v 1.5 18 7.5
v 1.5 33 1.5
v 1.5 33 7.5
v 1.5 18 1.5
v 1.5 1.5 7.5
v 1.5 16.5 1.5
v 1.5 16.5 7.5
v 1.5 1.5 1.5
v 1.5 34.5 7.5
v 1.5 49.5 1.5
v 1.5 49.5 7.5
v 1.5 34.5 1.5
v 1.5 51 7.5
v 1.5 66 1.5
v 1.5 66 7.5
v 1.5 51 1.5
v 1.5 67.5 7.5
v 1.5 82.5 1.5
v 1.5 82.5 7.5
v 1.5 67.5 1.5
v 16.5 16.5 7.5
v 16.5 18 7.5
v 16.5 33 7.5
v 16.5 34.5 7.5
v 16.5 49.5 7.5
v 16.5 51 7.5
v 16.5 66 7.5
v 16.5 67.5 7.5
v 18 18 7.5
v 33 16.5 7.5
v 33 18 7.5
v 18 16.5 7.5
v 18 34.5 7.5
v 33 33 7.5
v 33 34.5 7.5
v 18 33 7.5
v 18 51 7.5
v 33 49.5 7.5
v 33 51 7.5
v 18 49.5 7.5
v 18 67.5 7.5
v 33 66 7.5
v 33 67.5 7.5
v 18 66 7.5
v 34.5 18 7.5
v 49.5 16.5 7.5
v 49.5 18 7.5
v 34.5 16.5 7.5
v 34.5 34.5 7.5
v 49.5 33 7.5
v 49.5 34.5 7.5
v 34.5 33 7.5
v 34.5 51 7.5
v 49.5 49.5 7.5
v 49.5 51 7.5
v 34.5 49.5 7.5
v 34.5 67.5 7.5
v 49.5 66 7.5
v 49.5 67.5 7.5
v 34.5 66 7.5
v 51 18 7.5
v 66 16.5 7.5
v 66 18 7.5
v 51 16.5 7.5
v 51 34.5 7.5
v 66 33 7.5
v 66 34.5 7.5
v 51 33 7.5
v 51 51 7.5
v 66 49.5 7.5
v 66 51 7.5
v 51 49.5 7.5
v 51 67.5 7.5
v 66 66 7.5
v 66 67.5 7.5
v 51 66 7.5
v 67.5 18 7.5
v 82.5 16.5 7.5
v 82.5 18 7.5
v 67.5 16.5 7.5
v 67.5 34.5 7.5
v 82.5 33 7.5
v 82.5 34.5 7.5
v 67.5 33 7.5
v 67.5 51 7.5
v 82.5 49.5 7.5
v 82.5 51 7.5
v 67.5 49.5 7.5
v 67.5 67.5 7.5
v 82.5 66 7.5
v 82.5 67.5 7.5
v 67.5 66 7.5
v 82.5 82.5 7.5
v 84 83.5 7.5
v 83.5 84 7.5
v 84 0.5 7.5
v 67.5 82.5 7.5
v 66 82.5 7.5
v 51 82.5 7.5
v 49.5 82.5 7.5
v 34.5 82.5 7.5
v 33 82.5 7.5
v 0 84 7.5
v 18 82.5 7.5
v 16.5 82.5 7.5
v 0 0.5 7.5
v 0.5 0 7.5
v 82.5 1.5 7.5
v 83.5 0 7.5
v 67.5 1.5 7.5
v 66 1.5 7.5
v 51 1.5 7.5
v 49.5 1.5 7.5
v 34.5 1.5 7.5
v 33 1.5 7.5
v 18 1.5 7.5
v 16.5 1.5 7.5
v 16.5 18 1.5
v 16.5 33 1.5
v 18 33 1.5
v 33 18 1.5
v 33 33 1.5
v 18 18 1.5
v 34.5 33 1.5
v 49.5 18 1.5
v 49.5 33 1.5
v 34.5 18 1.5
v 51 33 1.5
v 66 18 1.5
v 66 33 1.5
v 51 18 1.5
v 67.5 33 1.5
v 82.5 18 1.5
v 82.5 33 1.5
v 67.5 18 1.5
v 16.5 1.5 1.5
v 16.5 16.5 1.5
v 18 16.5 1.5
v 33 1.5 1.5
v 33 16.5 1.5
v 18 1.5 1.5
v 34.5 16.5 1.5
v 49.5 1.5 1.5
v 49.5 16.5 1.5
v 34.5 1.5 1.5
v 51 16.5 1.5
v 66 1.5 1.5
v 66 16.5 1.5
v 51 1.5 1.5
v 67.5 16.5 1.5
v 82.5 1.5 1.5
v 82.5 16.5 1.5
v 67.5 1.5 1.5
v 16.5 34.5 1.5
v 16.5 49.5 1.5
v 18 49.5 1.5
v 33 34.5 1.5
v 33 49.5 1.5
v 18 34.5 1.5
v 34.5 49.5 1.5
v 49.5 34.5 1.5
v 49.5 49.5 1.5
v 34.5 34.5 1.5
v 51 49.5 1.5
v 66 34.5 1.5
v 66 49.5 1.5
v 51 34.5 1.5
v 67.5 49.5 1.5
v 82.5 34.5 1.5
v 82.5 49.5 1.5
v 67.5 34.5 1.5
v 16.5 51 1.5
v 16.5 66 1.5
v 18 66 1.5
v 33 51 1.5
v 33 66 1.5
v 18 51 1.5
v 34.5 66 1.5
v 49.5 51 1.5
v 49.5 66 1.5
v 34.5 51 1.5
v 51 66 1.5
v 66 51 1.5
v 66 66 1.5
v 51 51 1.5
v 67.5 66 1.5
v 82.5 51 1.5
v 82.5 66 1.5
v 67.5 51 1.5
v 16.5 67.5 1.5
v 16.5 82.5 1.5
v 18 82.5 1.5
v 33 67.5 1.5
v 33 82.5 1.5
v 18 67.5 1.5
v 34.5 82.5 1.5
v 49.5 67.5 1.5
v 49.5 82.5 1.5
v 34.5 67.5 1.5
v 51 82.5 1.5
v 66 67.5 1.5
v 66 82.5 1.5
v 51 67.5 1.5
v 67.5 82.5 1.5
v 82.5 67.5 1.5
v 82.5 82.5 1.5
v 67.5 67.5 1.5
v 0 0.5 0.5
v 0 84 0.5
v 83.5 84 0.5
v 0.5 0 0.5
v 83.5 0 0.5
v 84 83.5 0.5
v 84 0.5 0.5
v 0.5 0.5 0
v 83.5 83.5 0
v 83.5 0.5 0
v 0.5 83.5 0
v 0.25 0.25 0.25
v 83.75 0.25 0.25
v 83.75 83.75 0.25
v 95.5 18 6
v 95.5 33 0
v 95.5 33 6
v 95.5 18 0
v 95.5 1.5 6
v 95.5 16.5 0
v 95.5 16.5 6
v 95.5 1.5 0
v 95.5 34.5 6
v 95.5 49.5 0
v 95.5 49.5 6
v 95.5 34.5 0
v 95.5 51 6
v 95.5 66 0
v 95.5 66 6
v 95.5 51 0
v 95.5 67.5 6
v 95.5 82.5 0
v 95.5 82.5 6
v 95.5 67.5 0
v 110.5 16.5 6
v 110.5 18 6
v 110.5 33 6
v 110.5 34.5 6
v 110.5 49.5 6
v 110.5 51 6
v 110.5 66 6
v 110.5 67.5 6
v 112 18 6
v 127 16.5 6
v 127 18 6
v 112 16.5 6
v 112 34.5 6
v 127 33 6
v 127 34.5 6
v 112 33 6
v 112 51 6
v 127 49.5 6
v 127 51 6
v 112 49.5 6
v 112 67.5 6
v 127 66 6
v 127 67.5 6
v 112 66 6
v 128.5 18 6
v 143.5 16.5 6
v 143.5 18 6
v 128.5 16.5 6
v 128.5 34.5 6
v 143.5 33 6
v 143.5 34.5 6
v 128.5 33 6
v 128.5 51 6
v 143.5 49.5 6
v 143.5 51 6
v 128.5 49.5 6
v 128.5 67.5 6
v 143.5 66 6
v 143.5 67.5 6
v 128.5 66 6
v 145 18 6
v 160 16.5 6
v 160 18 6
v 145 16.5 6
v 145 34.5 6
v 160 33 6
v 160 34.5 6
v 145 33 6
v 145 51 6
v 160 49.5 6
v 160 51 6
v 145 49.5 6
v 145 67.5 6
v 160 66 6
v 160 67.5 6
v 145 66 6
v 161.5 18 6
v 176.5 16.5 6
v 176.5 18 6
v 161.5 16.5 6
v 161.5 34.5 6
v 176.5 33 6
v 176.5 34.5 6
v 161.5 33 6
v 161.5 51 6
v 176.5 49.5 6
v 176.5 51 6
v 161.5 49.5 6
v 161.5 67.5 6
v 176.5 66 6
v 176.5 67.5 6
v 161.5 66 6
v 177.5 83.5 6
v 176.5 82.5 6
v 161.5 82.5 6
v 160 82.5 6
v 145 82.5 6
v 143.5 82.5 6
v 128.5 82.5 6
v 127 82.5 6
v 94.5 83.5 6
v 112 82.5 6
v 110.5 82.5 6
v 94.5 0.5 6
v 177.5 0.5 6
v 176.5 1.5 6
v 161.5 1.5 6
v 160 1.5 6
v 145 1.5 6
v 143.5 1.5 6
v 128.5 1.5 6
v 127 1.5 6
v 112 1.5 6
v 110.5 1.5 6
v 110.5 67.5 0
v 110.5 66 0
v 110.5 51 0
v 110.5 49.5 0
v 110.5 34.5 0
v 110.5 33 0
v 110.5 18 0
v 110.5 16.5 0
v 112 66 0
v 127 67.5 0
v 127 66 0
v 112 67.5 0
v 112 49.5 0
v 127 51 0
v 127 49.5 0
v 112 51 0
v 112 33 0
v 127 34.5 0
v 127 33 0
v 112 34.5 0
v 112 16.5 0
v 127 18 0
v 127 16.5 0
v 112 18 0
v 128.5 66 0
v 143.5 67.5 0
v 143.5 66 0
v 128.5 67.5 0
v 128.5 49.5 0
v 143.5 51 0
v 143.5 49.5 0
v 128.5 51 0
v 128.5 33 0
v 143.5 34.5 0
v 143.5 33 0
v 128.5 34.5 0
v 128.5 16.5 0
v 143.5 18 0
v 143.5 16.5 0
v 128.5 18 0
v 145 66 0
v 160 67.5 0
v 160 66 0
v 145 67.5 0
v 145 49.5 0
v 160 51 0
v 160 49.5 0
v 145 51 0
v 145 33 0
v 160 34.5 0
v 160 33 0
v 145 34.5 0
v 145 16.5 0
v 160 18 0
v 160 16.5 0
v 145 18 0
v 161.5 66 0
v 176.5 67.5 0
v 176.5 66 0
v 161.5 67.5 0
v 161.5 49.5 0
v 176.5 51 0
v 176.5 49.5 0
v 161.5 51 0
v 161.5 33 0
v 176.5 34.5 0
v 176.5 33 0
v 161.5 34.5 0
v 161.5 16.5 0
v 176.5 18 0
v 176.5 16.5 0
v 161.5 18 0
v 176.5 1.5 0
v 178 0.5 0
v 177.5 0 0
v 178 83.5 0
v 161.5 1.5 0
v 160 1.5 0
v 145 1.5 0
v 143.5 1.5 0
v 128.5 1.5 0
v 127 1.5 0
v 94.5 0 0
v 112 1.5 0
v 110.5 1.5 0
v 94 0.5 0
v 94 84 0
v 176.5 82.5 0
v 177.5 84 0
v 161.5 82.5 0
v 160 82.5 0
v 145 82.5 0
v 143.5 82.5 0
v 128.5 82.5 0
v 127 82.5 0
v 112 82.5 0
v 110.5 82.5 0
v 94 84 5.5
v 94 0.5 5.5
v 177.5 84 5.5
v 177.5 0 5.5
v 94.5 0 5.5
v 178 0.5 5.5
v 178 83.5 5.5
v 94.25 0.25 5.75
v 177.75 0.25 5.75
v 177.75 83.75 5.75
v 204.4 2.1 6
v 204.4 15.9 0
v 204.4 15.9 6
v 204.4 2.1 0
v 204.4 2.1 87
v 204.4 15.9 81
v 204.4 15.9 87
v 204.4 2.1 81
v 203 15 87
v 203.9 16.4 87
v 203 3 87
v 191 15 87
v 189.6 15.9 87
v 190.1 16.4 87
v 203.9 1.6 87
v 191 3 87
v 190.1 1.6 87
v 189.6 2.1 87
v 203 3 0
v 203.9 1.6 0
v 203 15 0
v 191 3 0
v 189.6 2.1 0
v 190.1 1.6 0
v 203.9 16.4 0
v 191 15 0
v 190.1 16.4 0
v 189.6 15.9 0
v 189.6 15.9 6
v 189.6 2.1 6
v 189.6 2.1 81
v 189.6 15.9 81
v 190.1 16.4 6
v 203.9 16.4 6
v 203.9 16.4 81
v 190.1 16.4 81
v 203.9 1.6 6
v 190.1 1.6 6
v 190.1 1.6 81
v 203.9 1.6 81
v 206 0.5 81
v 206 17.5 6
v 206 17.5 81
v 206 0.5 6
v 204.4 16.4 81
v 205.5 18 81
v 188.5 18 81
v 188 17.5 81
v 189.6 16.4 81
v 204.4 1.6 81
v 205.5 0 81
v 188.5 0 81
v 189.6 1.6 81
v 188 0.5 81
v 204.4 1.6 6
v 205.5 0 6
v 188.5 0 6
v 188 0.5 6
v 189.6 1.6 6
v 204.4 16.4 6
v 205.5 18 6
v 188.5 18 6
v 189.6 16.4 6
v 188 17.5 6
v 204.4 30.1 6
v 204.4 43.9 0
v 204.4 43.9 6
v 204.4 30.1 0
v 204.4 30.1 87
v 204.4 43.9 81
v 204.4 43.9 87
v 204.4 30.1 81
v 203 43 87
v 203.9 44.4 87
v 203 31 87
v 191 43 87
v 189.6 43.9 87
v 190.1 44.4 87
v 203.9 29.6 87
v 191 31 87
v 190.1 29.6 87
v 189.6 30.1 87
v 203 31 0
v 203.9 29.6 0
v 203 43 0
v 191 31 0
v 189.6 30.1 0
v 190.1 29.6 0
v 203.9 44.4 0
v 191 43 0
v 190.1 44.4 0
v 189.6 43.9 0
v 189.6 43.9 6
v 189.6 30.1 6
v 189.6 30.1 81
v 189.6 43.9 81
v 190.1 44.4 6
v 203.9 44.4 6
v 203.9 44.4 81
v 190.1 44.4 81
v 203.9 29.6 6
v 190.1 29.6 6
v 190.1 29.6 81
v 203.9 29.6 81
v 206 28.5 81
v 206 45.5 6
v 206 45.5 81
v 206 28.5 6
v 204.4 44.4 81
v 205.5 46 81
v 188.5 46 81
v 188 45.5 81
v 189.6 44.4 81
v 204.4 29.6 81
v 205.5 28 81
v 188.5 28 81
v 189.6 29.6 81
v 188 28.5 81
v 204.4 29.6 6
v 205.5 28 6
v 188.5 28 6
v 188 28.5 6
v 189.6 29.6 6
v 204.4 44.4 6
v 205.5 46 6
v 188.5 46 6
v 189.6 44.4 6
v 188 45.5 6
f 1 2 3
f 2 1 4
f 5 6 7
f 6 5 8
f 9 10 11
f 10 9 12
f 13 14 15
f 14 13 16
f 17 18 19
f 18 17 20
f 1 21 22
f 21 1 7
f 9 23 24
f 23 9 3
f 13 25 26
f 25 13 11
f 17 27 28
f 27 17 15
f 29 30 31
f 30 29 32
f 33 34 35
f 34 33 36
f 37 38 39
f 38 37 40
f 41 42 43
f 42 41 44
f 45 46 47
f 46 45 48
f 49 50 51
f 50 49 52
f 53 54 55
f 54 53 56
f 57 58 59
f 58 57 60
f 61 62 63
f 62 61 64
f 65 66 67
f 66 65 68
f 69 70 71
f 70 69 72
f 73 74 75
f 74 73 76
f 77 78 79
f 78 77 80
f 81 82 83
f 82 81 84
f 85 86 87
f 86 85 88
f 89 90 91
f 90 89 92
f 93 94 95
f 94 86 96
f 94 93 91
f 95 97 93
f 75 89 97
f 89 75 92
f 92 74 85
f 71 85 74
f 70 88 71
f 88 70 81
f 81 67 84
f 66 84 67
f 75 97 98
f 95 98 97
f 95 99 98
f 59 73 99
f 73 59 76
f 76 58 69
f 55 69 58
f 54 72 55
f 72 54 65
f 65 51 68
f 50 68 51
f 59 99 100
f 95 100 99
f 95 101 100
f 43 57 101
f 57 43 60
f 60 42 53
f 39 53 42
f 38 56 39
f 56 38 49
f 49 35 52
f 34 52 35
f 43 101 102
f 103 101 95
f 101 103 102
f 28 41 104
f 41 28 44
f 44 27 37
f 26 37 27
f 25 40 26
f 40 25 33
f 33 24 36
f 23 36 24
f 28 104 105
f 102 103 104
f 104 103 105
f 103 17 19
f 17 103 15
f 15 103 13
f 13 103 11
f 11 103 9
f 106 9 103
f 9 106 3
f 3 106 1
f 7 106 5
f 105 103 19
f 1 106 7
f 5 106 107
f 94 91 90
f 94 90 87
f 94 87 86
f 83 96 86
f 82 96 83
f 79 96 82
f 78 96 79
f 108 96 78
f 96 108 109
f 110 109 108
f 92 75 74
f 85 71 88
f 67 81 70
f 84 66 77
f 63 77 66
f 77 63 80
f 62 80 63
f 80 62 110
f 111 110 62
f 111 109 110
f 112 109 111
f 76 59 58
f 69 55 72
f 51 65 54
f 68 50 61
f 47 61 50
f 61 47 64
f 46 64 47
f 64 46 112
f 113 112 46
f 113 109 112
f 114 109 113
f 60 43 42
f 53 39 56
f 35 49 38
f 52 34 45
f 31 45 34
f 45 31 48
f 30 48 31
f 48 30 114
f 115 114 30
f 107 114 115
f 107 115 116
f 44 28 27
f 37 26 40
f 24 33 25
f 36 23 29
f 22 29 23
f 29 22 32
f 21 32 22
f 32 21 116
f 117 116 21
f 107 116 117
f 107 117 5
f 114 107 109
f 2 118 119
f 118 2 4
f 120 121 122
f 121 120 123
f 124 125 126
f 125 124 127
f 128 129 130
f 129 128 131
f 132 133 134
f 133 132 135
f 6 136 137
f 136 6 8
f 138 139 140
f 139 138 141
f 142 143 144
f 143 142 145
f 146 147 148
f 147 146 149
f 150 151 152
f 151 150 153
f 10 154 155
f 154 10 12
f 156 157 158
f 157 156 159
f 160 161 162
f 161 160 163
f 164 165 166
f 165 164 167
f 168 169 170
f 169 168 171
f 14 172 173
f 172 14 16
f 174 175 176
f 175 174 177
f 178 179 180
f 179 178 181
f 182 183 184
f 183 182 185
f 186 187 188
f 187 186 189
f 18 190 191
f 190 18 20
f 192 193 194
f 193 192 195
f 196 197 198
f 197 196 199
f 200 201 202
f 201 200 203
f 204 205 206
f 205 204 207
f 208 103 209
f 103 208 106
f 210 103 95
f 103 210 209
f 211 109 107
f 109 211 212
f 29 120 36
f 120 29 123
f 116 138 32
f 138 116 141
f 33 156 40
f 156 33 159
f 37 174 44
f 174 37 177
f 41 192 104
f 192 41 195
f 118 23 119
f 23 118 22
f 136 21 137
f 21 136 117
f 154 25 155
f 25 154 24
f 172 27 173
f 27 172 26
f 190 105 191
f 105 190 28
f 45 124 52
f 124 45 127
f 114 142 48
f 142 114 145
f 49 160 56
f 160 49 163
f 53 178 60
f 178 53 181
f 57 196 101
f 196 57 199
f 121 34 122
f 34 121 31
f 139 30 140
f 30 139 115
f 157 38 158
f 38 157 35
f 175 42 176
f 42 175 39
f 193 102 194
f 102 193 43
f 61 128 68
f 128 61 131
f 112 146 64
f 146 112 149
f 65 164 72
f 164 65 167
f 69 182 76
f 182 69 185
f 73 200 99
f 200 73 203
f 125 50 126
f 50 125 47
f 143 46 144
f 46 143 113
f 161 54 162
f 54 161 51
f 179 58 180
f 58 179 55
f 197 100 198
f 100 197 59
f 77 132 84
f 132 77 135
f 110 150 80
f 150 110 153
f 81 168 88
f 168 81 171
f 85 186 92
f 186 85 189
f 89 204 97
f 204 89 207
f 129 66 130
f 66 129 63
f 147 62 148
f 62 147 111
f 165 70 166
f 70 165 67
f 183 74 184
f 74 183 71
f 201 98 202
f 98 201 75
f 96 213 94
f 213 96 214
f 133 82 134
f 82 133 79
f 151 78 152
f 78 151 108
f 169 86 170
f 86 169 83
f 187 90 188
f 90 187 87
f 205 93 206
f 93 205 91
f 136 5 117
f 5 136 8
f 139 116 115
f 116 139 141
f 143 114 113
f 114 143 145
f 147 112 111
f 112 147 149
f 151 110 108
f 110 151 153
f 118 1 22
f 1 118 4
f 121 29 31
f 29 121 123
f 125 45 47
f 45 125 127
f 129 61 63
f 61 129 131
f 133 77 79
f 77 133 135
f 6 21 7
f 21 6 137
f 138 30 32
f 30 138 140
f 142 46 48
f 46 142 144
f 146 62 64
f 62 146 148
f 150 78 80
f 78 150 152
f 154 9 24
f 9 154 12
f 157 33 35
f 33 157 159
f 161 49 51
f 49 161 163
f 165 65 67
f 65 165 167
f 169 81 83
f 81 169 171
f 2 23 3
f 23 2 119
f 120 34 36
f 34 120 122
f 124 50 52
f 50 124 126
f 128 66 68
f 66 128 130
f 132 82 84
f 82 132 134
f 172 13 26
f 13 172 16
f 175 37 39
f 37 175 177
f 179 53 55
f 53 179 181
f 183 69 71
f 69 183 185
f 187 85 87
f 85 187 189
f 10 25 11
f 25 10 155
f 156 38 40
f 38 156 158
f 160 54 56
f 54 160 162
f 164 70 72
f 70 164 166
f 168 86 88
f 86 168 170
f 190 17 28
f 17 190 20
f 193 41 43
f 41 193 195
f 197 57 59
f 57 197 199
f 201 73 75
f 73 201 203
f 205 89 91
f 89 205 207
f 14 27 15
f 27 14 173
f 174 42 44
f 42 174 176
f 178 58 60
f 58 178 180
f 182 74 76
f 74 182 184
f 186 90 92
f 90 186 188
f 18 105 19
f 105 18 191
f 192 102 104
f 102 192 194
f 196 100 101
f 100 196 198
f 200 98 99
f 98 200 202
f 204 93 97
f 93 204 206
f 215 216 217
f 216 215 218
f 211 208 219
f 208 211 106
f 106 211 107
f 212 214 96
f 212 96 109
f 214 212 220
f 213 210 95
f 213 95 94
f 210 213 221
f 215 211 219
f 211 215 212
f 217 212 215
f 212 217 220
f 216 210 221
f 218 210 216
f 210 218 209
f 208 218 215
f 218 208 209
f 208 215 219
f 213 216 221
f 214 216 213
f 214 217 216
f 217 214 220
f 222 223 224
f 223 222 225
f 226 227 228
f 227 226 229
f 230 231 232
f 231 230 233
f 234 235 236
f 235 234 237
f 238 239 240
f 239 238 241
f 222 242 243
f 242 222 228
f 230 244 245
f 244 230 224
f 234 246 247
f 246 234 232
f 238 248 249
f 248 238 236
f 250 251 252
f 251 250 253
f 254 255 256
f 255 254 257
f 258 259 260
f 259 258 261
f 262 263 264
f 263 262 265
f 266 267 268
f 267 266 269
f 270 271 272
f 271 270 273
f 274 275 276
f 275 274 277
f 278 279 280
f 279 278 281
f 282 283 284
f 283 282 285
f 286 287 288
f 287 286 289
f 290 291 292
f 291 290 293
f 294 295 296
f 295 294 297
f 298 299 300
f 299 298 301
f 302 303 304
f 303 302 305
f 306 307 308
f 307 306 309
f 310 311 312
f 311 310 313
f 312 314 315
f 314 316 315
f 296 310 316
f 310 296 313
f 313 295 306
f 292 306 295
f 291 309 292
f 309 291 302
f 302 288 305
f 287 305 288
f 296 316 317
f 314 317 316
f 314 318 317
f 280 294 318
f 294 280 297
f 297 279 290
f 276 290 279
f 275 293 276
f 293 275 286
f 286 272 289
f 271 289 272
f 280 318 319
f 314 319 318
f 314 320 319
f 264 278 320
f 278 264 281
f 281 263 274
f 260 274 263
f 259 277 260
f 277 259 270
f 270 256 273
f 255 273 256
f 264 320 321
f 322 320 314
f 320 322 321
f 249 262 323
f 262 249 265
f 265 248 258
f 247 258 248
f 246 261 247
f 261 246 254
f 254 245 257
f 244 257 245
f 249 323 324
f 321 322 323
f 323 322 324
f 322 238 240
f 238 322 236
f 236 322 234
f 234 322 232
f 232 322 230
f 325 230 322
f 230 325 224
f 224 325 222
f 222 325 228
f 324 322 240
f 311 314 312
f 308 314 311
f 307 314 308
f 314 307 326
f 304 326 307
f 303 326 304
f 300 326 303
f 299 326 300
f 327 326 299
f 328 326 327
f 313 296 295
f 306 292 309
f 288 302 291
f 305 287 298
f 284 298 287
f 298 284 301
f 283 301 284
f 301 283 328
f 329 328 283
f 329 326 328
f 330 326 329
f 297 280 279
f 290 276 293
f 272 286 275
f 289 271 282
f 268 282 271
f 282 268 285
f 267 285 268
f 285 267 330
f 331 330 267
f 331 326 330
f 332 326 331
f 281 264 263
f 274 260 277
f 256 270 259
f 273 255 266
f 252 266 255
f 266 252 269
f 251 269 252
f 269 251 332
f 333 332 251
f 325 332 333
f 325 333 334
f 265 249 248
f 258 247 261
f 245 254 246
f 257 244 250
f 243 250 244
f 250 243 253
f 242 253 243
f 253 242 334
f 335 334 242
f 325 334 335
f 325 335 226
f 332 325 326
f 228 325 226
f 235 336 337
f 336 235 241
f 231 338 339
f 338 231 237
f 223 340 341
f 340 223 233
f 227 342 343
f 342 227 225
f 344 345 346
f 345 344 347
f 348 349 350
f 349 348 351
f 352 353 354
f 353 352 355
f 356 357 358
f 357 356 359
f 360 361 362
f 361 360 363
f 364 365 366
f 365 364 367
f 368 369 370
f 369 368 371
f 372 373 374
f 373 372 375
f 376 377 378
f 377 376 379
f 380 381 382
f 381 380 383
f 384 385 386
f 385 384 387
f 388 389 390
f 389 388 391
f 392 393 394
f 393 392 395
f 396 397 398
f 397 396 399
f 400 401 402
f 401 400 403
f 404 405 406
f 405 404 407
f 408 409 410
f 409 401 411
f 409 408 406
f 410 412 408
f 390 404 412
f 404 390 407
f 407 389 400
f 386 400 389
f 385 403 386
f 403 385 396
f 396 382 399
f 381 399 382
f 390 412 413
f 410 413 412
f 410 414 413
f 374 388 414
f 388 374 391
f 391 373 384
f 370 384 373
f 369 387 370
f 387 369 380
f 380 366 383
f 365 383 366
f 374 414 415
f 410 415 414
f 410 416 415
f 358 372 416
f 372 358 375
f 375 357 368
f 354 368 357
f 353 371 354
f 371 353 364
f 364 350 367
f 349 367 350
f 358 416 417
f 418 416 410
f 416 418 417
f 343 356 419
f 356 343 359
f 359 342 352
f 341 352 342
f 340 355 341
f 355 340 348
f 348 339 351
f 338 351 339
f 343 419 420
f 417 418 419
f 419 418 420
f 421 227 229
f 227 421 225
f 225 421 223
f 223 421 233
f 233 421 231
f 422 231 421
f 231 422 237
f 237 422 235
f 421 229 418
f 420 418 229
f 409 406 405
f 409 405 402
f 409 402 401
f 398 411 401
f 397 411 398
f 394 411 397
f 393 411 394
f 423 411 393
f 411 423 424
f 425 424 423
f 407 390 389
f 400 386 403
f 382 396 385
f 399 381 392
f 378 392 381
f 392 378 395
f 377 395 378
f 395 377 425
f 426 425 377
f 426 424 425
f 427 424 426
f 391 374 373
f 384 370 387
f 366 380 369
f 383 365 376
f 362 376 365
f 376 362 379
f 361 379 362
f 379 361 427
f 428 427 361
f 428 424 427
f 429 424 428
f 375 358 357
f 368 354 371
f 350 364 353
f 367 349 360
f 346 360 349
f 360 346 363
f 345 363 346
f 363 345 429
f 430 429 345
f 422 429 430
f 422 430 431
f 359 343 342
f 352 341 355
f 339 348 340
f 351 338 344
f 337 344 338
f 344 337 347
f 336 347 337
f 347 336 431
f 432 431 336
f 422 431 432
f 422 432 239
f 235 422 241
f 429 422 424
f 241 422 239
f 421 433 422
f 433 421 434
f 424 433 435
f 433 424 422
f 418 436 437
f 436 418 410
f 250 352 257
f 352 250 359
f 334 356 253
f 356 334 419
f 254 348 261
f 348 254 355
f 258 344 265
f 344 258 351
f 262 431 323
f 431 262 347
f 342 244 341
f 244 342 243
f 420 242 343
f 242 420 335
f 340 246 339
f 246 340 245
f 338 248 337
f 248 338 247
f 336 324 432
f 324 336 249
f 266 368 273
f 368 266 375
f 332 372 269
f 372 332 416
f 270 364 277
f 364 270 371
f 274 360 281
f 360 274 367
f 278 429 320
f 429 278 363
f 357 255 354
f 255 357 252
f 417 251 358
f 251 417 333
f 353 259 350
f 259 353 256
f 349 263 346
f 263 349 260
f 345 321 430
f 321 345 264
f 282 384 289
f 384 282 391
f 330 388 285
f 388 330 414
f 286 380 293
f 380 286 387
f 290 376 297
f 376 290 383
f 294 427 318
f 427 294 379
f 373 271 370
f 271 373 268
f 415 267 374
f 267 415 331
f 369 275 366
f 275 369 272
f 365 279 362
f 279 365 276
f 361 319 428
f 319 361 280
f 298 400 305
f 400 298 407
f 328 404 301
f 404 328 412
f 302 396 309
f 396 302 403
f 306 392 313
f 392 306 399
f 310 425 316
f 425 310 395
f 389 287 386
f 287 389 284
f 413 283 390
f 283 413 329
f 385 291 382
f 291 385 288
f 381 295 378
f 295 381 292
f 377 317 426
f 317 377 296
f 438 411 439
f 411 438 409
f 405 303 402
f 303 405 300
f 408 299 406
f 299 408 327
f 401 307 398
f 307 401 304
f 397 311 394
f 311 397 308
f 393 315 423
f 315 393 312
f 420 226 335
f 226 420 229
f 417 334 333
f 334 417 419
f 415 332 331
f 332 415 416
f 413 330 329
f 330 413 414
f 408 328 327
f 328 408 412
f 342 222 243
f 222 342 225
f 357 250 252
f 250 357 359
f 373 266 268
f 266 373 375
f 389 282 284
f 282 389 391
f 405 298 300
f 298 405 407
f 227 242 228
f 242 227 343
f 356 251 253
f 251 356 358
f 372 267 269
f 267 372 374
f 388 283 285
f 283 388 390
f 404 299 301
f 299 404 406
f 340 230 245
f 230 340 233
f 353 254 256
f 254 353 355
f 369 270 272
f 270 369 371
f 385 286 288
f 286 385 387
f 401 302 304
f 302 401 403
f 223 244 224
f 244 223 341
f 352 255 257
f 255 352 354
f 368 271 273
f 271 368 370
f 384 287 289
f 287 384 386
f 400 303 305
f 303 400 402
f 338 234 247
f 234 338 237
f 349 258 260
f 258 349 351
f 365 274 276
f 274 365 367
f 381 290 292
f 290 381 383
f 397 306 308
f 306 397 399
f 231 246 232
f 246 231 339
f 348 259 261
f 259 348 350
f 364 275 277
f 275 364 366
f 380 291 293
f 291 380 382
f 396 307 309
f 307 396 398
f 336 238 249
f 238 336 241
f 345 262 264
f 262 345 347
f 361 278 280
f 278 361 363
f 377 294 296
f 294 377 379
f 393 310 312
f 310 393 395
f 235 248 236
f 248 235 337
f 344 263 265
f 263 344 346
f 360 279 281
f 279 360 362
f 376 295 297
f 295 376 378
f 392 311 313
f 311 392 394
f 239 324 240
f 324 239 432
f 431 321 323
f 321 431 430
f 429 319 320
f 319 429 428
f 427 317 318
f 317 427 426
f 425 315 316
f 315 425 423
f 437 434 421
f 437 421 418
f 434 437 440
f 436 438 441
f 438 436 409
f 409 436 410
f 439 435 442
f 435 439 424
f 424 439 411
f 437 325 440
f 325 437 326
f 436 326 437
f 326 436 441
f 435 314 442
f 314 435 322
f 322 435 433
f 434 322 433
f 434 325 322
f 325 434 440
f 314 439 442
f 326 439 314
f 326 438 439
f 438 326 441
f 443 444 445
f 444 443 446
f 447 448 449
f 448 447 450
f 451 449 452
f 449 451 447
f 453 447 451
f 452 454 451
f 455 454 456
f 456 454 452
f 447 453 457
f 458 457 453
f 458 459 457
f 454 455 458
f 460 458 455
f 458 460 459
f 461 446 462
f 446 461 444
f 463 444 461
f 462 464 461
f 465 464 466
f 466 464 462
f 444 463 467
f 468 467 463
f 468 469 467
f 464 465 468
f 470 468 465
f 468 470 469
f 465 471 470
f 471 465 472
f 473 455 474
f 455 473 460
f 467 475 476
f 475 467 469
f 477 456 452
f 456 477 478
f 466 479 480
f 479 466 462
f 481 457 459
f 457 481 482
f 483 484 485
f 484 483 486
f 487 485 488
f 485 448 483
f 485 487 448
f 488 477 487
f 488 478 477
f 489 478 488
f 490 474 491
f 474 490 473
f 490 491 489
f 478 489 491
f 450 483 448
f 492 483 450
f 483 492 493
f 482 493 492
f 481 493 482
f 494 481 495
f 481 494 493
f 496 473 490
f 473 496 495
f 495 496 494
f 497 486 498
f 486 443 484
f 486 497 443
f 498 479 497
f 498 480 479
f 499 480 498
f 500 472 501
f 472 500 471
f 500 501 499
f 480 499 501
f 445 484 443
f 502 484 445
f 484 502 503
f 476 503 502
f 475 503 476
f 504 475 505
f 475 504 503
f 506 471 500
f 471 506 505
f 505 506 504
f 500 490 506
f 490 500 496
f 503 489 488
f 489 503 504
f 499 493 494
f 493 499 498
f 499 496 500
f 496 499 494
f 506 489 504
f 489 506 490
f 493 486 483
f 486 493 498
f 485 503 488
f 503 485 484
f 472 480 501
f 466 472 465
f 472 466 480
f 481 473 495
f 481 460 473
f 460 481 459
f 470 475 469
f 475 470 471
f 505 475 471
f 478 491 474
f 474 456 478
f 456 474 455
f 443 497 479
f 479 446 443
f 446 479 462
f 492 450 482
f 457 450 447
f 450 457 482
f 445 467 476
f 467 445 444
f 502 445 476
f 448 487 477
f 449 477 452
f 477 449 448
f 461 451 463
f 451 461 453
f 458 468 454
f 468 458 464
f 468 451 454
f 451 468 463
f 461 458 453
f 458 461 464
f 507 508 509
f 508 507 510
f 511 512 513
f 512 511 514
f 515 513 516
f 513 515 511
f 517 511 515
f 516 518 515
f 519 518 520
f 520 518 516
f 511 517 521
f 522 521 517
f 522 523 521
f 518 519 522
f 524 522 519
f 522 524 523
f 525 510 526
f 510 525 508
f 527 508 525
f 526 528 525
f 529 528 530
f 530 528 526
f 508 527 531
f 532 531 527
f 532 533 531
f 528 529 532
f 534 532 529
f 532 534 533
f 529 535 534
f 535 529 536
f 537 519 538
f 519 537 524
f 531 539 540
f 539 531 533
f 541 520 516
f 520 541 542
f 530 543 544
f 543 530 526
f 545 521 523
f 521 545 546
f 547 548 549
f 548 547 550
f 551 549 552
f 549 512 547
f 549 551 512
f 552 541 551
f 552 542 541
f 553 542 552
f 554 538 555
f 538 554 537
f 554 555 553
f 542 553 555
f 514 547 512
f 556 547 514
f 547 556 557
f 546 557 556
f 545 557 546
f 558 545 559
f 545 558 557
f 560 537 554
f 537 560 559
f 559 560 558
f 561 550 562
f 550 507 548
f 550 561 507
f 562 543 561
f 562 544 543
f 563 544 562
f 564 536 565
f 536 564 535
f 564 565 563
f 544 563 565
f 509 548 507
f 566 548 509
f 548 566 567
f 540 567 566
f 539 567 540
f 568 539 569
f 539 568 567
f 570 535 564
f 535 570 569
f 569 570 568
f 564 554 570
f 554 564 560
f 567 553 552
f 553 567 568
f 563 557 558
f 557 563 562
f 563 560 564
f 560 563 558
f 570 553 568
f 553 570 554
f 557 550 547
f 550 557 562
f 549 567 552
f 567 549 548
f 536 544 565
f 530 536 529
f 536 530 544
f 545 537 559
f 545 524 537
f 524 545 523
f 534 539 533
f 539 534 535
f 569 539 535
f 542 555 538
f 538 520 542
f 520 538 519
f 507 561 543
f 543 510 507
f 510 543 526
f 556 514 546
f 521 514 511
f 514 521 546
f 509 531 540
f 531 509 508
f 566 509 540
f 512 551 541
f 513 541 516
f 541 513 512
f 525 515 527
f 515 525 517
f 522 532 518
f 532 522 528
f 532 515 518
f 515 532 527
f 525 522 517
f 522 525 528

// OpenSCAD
// preview[view:south west, tilt:top diagonal]

//number of x dimension holes
num_x_holes=5; 
//number of x dimension holes
num_y_holes=5; 
// size of holes on X axis (mm)
hole_x_size=15; 
// size of holes on Y axis (mm)
hole_y_size=15; 
// height of the upper and lower grid (mm)
grid_height=6; 
// thickness of the grid webs (mm)
web_thickness=1.5; // [1:0.5:3]
//Height of the risers (mm) between upper and lower
riser_height=75; //[10:200]
// number of vertical risers 
num_risers=2; // [0:1:6]
// hollow risers (boolean)
hollow_risers=1; // [0:NOT Hollow, 1:Hollow]

// hollow supports
show_base=1; // [0:NO base, 1:Include Base]
// hollow supports
show_top=1; // [0:NO top, 1:Include Top]


//bevel size (bevel on outer edges)
bevel_sz=.5; // [0:0.5:2]
//tolerance (increase if parts too tight, decrease if parts too loose)
tolerance=.1;  

/* [Hidden] */

//derived values
x_len=web_thickness + num_x_holes*(hole_x_size+web_thickness);
y_len=web_thickness + num_y_holes*(hole_y_size+web_thickness);
z_len=web_thickness;

show_part();

module show_part() {
    if ( show_base >0) {
        base();
    }
    if (show_top > 0 ) {
        translate([show_base * (x_len+10), 0,0])
            upper();
    }
    translate([(show_base + show_top)*(x_len+10), 0,0])
        riser();
}

module base() {
    difference() {
        union() {
            //base
            cube([x_len, y_len, z_len]);
            
            for(i=[0:num_x_holes]) {
                translate([i*(hole_x_size+web_thickness),0,z_len])
                    cube([web_thickness, 
                        y_len,
                        grid_height]);
            }
            for(i=[0:num_y_holes]) {
                translate([0,i*(hole_y_size+web_thickness),z_len])
                    cube([x_len, 
                        web_thickness, 
                        grid_height]);
            }
        }
        
        //bevel corners
        for (i=[0:1]) {
            for (j=[0:1]) {
                translate([i*x_len,j*y_len,0]) 
                    rotate([0,0,i*90+ j*90]) {
                        bevel(bevel_sz, length=grid_height+z_len);
                }
            }
        }
        for (i=[0:1]) {
            translate([0,i*y_len,0]) 
                rotate([90,-90*i,90]) {
                    bevel(bevel_sz, length=x_len);
            }
        }
        for (j=[0:1]) {
            translate([j*x_len,0,0]) 
                rotate([-90,-90-90*j,0]) {
                    bevel(bevel_sz, length=x_len);
            }
        }
        
        
    }
}


L2_height=riser_height+z_len+grid_height;
//upper grid
module upper() {
    
    difference() {
        union() {
            for(i=[0:num_x_holes]) {
                translate([i*(hole_x_size+web_thickness),0,0])
                    cube([web_thickness, 
                        y_len,
                        grid_height]);
            }
            for(i=[0:num_y_holes]) {
                translate([0,i*(hole_y_size+web_thickness),0])
                    cube([x_len, 
                        web_thickness, 
                        grid_height]);
            }
        }
        
        //bevel corners
        for (i=[0:1]) {
            for (j=[0:1]) {
                translate([i*x_len,j*y_len,0]) 
                    rotate([0,0,i*90+ j*90]) {
                        bevel(bevel_sz, length=grid_height);
                }
            }
        }
        for (i=[0:1]) {
            translate([0,i*y_len,grid_height]) 
                rotate([90,90+90*i,90]) {
                    bevel(bevel_sz, length=x_len);
            }
        }
        for (j=[0:1]) {
            translate([j*x_len,0,grid_height]) 
                rotate([-90,90*j,0]) {
                    bevel(bevel_sz, length=x_len);
            }
        }
    }
    
}
//risers
module riser() {
    for(i=[0:num_risers-1]) {
        translate([0,i*(hole_y_size + 2*web_thickness +10),0])
            difference() {
                union() {
                    translate([web_thickness+tolerance,
                            web_thickness+tolerance,0])
                        // inner
                        cube([hole_x_size - 2*tolerance, 
                            hole_y_size - 2*tolerance,
                            2*grid_height +riser_height]);
                    translate([0, 0,grid_height])
                        cube([hole_x_size+2*web_thickness, 
                            hole_y_size+2*web_thickness,
                            riser_height]);
                }
                            
                if (hollow_risers ==1) {
                    translate([2*web_thickness,2*web_thickness,0])
                        cube([hole_x_size- 2*web_thickness, 
                            hole_y_size - 2*web_thickness,
                            2*grid_height +riser_height]);
                }
                //bevel outer
                for (i=[0:1]) {
                    for (j=[0:1]) {
                        translate([i*(hole_x_size+2*web_thickness),
                                j*(hole_y_size+2*web_thickness),
                                grid_height]) 
                            rotate([0,0, 90*i -90*j  + (180*i*j)]) {
                                bevel(bevel_sz, length=riser_height);
                        }
                    }
                }
                //bevel inner
                for (i=[0:1]) {
                    for (j=[0:1]) {
                        translate([web_thickness+tolerance + i*(hole_x_size-2*tolerance),
                                web_thickness+tolerance +j*(hole_y_size-2*tolerance),
                                0])
                            rotate([0,0, 90*i -90*j  + (180*i*j)]) {
                                bevel(bevel_sz, length=grid_height);
                        }
                        translate([web_thickness+tolerance + i*(hole_x_size-2*tolerance),
                                web_thickness+tolerance +j*(hole_y_size-2*tolerance),
                                grid_height + riser_height])
                            rotate([0,0, 90*i -90*j  + (180*i*j)]) {
                                bevel(bevel_sz, length=grid_height);
                        }
                    }
                }
               
            }
    }
}

module bevel(size=1, length=0) {
    
    if (length>0) {
        linear_extrude(height=length, center=false)
            polygon([[0,0], [size,0], [0,size]]);
    } else {
        polygon([[0,0], [size,0], [0,size]]);
    }
    
}
    
